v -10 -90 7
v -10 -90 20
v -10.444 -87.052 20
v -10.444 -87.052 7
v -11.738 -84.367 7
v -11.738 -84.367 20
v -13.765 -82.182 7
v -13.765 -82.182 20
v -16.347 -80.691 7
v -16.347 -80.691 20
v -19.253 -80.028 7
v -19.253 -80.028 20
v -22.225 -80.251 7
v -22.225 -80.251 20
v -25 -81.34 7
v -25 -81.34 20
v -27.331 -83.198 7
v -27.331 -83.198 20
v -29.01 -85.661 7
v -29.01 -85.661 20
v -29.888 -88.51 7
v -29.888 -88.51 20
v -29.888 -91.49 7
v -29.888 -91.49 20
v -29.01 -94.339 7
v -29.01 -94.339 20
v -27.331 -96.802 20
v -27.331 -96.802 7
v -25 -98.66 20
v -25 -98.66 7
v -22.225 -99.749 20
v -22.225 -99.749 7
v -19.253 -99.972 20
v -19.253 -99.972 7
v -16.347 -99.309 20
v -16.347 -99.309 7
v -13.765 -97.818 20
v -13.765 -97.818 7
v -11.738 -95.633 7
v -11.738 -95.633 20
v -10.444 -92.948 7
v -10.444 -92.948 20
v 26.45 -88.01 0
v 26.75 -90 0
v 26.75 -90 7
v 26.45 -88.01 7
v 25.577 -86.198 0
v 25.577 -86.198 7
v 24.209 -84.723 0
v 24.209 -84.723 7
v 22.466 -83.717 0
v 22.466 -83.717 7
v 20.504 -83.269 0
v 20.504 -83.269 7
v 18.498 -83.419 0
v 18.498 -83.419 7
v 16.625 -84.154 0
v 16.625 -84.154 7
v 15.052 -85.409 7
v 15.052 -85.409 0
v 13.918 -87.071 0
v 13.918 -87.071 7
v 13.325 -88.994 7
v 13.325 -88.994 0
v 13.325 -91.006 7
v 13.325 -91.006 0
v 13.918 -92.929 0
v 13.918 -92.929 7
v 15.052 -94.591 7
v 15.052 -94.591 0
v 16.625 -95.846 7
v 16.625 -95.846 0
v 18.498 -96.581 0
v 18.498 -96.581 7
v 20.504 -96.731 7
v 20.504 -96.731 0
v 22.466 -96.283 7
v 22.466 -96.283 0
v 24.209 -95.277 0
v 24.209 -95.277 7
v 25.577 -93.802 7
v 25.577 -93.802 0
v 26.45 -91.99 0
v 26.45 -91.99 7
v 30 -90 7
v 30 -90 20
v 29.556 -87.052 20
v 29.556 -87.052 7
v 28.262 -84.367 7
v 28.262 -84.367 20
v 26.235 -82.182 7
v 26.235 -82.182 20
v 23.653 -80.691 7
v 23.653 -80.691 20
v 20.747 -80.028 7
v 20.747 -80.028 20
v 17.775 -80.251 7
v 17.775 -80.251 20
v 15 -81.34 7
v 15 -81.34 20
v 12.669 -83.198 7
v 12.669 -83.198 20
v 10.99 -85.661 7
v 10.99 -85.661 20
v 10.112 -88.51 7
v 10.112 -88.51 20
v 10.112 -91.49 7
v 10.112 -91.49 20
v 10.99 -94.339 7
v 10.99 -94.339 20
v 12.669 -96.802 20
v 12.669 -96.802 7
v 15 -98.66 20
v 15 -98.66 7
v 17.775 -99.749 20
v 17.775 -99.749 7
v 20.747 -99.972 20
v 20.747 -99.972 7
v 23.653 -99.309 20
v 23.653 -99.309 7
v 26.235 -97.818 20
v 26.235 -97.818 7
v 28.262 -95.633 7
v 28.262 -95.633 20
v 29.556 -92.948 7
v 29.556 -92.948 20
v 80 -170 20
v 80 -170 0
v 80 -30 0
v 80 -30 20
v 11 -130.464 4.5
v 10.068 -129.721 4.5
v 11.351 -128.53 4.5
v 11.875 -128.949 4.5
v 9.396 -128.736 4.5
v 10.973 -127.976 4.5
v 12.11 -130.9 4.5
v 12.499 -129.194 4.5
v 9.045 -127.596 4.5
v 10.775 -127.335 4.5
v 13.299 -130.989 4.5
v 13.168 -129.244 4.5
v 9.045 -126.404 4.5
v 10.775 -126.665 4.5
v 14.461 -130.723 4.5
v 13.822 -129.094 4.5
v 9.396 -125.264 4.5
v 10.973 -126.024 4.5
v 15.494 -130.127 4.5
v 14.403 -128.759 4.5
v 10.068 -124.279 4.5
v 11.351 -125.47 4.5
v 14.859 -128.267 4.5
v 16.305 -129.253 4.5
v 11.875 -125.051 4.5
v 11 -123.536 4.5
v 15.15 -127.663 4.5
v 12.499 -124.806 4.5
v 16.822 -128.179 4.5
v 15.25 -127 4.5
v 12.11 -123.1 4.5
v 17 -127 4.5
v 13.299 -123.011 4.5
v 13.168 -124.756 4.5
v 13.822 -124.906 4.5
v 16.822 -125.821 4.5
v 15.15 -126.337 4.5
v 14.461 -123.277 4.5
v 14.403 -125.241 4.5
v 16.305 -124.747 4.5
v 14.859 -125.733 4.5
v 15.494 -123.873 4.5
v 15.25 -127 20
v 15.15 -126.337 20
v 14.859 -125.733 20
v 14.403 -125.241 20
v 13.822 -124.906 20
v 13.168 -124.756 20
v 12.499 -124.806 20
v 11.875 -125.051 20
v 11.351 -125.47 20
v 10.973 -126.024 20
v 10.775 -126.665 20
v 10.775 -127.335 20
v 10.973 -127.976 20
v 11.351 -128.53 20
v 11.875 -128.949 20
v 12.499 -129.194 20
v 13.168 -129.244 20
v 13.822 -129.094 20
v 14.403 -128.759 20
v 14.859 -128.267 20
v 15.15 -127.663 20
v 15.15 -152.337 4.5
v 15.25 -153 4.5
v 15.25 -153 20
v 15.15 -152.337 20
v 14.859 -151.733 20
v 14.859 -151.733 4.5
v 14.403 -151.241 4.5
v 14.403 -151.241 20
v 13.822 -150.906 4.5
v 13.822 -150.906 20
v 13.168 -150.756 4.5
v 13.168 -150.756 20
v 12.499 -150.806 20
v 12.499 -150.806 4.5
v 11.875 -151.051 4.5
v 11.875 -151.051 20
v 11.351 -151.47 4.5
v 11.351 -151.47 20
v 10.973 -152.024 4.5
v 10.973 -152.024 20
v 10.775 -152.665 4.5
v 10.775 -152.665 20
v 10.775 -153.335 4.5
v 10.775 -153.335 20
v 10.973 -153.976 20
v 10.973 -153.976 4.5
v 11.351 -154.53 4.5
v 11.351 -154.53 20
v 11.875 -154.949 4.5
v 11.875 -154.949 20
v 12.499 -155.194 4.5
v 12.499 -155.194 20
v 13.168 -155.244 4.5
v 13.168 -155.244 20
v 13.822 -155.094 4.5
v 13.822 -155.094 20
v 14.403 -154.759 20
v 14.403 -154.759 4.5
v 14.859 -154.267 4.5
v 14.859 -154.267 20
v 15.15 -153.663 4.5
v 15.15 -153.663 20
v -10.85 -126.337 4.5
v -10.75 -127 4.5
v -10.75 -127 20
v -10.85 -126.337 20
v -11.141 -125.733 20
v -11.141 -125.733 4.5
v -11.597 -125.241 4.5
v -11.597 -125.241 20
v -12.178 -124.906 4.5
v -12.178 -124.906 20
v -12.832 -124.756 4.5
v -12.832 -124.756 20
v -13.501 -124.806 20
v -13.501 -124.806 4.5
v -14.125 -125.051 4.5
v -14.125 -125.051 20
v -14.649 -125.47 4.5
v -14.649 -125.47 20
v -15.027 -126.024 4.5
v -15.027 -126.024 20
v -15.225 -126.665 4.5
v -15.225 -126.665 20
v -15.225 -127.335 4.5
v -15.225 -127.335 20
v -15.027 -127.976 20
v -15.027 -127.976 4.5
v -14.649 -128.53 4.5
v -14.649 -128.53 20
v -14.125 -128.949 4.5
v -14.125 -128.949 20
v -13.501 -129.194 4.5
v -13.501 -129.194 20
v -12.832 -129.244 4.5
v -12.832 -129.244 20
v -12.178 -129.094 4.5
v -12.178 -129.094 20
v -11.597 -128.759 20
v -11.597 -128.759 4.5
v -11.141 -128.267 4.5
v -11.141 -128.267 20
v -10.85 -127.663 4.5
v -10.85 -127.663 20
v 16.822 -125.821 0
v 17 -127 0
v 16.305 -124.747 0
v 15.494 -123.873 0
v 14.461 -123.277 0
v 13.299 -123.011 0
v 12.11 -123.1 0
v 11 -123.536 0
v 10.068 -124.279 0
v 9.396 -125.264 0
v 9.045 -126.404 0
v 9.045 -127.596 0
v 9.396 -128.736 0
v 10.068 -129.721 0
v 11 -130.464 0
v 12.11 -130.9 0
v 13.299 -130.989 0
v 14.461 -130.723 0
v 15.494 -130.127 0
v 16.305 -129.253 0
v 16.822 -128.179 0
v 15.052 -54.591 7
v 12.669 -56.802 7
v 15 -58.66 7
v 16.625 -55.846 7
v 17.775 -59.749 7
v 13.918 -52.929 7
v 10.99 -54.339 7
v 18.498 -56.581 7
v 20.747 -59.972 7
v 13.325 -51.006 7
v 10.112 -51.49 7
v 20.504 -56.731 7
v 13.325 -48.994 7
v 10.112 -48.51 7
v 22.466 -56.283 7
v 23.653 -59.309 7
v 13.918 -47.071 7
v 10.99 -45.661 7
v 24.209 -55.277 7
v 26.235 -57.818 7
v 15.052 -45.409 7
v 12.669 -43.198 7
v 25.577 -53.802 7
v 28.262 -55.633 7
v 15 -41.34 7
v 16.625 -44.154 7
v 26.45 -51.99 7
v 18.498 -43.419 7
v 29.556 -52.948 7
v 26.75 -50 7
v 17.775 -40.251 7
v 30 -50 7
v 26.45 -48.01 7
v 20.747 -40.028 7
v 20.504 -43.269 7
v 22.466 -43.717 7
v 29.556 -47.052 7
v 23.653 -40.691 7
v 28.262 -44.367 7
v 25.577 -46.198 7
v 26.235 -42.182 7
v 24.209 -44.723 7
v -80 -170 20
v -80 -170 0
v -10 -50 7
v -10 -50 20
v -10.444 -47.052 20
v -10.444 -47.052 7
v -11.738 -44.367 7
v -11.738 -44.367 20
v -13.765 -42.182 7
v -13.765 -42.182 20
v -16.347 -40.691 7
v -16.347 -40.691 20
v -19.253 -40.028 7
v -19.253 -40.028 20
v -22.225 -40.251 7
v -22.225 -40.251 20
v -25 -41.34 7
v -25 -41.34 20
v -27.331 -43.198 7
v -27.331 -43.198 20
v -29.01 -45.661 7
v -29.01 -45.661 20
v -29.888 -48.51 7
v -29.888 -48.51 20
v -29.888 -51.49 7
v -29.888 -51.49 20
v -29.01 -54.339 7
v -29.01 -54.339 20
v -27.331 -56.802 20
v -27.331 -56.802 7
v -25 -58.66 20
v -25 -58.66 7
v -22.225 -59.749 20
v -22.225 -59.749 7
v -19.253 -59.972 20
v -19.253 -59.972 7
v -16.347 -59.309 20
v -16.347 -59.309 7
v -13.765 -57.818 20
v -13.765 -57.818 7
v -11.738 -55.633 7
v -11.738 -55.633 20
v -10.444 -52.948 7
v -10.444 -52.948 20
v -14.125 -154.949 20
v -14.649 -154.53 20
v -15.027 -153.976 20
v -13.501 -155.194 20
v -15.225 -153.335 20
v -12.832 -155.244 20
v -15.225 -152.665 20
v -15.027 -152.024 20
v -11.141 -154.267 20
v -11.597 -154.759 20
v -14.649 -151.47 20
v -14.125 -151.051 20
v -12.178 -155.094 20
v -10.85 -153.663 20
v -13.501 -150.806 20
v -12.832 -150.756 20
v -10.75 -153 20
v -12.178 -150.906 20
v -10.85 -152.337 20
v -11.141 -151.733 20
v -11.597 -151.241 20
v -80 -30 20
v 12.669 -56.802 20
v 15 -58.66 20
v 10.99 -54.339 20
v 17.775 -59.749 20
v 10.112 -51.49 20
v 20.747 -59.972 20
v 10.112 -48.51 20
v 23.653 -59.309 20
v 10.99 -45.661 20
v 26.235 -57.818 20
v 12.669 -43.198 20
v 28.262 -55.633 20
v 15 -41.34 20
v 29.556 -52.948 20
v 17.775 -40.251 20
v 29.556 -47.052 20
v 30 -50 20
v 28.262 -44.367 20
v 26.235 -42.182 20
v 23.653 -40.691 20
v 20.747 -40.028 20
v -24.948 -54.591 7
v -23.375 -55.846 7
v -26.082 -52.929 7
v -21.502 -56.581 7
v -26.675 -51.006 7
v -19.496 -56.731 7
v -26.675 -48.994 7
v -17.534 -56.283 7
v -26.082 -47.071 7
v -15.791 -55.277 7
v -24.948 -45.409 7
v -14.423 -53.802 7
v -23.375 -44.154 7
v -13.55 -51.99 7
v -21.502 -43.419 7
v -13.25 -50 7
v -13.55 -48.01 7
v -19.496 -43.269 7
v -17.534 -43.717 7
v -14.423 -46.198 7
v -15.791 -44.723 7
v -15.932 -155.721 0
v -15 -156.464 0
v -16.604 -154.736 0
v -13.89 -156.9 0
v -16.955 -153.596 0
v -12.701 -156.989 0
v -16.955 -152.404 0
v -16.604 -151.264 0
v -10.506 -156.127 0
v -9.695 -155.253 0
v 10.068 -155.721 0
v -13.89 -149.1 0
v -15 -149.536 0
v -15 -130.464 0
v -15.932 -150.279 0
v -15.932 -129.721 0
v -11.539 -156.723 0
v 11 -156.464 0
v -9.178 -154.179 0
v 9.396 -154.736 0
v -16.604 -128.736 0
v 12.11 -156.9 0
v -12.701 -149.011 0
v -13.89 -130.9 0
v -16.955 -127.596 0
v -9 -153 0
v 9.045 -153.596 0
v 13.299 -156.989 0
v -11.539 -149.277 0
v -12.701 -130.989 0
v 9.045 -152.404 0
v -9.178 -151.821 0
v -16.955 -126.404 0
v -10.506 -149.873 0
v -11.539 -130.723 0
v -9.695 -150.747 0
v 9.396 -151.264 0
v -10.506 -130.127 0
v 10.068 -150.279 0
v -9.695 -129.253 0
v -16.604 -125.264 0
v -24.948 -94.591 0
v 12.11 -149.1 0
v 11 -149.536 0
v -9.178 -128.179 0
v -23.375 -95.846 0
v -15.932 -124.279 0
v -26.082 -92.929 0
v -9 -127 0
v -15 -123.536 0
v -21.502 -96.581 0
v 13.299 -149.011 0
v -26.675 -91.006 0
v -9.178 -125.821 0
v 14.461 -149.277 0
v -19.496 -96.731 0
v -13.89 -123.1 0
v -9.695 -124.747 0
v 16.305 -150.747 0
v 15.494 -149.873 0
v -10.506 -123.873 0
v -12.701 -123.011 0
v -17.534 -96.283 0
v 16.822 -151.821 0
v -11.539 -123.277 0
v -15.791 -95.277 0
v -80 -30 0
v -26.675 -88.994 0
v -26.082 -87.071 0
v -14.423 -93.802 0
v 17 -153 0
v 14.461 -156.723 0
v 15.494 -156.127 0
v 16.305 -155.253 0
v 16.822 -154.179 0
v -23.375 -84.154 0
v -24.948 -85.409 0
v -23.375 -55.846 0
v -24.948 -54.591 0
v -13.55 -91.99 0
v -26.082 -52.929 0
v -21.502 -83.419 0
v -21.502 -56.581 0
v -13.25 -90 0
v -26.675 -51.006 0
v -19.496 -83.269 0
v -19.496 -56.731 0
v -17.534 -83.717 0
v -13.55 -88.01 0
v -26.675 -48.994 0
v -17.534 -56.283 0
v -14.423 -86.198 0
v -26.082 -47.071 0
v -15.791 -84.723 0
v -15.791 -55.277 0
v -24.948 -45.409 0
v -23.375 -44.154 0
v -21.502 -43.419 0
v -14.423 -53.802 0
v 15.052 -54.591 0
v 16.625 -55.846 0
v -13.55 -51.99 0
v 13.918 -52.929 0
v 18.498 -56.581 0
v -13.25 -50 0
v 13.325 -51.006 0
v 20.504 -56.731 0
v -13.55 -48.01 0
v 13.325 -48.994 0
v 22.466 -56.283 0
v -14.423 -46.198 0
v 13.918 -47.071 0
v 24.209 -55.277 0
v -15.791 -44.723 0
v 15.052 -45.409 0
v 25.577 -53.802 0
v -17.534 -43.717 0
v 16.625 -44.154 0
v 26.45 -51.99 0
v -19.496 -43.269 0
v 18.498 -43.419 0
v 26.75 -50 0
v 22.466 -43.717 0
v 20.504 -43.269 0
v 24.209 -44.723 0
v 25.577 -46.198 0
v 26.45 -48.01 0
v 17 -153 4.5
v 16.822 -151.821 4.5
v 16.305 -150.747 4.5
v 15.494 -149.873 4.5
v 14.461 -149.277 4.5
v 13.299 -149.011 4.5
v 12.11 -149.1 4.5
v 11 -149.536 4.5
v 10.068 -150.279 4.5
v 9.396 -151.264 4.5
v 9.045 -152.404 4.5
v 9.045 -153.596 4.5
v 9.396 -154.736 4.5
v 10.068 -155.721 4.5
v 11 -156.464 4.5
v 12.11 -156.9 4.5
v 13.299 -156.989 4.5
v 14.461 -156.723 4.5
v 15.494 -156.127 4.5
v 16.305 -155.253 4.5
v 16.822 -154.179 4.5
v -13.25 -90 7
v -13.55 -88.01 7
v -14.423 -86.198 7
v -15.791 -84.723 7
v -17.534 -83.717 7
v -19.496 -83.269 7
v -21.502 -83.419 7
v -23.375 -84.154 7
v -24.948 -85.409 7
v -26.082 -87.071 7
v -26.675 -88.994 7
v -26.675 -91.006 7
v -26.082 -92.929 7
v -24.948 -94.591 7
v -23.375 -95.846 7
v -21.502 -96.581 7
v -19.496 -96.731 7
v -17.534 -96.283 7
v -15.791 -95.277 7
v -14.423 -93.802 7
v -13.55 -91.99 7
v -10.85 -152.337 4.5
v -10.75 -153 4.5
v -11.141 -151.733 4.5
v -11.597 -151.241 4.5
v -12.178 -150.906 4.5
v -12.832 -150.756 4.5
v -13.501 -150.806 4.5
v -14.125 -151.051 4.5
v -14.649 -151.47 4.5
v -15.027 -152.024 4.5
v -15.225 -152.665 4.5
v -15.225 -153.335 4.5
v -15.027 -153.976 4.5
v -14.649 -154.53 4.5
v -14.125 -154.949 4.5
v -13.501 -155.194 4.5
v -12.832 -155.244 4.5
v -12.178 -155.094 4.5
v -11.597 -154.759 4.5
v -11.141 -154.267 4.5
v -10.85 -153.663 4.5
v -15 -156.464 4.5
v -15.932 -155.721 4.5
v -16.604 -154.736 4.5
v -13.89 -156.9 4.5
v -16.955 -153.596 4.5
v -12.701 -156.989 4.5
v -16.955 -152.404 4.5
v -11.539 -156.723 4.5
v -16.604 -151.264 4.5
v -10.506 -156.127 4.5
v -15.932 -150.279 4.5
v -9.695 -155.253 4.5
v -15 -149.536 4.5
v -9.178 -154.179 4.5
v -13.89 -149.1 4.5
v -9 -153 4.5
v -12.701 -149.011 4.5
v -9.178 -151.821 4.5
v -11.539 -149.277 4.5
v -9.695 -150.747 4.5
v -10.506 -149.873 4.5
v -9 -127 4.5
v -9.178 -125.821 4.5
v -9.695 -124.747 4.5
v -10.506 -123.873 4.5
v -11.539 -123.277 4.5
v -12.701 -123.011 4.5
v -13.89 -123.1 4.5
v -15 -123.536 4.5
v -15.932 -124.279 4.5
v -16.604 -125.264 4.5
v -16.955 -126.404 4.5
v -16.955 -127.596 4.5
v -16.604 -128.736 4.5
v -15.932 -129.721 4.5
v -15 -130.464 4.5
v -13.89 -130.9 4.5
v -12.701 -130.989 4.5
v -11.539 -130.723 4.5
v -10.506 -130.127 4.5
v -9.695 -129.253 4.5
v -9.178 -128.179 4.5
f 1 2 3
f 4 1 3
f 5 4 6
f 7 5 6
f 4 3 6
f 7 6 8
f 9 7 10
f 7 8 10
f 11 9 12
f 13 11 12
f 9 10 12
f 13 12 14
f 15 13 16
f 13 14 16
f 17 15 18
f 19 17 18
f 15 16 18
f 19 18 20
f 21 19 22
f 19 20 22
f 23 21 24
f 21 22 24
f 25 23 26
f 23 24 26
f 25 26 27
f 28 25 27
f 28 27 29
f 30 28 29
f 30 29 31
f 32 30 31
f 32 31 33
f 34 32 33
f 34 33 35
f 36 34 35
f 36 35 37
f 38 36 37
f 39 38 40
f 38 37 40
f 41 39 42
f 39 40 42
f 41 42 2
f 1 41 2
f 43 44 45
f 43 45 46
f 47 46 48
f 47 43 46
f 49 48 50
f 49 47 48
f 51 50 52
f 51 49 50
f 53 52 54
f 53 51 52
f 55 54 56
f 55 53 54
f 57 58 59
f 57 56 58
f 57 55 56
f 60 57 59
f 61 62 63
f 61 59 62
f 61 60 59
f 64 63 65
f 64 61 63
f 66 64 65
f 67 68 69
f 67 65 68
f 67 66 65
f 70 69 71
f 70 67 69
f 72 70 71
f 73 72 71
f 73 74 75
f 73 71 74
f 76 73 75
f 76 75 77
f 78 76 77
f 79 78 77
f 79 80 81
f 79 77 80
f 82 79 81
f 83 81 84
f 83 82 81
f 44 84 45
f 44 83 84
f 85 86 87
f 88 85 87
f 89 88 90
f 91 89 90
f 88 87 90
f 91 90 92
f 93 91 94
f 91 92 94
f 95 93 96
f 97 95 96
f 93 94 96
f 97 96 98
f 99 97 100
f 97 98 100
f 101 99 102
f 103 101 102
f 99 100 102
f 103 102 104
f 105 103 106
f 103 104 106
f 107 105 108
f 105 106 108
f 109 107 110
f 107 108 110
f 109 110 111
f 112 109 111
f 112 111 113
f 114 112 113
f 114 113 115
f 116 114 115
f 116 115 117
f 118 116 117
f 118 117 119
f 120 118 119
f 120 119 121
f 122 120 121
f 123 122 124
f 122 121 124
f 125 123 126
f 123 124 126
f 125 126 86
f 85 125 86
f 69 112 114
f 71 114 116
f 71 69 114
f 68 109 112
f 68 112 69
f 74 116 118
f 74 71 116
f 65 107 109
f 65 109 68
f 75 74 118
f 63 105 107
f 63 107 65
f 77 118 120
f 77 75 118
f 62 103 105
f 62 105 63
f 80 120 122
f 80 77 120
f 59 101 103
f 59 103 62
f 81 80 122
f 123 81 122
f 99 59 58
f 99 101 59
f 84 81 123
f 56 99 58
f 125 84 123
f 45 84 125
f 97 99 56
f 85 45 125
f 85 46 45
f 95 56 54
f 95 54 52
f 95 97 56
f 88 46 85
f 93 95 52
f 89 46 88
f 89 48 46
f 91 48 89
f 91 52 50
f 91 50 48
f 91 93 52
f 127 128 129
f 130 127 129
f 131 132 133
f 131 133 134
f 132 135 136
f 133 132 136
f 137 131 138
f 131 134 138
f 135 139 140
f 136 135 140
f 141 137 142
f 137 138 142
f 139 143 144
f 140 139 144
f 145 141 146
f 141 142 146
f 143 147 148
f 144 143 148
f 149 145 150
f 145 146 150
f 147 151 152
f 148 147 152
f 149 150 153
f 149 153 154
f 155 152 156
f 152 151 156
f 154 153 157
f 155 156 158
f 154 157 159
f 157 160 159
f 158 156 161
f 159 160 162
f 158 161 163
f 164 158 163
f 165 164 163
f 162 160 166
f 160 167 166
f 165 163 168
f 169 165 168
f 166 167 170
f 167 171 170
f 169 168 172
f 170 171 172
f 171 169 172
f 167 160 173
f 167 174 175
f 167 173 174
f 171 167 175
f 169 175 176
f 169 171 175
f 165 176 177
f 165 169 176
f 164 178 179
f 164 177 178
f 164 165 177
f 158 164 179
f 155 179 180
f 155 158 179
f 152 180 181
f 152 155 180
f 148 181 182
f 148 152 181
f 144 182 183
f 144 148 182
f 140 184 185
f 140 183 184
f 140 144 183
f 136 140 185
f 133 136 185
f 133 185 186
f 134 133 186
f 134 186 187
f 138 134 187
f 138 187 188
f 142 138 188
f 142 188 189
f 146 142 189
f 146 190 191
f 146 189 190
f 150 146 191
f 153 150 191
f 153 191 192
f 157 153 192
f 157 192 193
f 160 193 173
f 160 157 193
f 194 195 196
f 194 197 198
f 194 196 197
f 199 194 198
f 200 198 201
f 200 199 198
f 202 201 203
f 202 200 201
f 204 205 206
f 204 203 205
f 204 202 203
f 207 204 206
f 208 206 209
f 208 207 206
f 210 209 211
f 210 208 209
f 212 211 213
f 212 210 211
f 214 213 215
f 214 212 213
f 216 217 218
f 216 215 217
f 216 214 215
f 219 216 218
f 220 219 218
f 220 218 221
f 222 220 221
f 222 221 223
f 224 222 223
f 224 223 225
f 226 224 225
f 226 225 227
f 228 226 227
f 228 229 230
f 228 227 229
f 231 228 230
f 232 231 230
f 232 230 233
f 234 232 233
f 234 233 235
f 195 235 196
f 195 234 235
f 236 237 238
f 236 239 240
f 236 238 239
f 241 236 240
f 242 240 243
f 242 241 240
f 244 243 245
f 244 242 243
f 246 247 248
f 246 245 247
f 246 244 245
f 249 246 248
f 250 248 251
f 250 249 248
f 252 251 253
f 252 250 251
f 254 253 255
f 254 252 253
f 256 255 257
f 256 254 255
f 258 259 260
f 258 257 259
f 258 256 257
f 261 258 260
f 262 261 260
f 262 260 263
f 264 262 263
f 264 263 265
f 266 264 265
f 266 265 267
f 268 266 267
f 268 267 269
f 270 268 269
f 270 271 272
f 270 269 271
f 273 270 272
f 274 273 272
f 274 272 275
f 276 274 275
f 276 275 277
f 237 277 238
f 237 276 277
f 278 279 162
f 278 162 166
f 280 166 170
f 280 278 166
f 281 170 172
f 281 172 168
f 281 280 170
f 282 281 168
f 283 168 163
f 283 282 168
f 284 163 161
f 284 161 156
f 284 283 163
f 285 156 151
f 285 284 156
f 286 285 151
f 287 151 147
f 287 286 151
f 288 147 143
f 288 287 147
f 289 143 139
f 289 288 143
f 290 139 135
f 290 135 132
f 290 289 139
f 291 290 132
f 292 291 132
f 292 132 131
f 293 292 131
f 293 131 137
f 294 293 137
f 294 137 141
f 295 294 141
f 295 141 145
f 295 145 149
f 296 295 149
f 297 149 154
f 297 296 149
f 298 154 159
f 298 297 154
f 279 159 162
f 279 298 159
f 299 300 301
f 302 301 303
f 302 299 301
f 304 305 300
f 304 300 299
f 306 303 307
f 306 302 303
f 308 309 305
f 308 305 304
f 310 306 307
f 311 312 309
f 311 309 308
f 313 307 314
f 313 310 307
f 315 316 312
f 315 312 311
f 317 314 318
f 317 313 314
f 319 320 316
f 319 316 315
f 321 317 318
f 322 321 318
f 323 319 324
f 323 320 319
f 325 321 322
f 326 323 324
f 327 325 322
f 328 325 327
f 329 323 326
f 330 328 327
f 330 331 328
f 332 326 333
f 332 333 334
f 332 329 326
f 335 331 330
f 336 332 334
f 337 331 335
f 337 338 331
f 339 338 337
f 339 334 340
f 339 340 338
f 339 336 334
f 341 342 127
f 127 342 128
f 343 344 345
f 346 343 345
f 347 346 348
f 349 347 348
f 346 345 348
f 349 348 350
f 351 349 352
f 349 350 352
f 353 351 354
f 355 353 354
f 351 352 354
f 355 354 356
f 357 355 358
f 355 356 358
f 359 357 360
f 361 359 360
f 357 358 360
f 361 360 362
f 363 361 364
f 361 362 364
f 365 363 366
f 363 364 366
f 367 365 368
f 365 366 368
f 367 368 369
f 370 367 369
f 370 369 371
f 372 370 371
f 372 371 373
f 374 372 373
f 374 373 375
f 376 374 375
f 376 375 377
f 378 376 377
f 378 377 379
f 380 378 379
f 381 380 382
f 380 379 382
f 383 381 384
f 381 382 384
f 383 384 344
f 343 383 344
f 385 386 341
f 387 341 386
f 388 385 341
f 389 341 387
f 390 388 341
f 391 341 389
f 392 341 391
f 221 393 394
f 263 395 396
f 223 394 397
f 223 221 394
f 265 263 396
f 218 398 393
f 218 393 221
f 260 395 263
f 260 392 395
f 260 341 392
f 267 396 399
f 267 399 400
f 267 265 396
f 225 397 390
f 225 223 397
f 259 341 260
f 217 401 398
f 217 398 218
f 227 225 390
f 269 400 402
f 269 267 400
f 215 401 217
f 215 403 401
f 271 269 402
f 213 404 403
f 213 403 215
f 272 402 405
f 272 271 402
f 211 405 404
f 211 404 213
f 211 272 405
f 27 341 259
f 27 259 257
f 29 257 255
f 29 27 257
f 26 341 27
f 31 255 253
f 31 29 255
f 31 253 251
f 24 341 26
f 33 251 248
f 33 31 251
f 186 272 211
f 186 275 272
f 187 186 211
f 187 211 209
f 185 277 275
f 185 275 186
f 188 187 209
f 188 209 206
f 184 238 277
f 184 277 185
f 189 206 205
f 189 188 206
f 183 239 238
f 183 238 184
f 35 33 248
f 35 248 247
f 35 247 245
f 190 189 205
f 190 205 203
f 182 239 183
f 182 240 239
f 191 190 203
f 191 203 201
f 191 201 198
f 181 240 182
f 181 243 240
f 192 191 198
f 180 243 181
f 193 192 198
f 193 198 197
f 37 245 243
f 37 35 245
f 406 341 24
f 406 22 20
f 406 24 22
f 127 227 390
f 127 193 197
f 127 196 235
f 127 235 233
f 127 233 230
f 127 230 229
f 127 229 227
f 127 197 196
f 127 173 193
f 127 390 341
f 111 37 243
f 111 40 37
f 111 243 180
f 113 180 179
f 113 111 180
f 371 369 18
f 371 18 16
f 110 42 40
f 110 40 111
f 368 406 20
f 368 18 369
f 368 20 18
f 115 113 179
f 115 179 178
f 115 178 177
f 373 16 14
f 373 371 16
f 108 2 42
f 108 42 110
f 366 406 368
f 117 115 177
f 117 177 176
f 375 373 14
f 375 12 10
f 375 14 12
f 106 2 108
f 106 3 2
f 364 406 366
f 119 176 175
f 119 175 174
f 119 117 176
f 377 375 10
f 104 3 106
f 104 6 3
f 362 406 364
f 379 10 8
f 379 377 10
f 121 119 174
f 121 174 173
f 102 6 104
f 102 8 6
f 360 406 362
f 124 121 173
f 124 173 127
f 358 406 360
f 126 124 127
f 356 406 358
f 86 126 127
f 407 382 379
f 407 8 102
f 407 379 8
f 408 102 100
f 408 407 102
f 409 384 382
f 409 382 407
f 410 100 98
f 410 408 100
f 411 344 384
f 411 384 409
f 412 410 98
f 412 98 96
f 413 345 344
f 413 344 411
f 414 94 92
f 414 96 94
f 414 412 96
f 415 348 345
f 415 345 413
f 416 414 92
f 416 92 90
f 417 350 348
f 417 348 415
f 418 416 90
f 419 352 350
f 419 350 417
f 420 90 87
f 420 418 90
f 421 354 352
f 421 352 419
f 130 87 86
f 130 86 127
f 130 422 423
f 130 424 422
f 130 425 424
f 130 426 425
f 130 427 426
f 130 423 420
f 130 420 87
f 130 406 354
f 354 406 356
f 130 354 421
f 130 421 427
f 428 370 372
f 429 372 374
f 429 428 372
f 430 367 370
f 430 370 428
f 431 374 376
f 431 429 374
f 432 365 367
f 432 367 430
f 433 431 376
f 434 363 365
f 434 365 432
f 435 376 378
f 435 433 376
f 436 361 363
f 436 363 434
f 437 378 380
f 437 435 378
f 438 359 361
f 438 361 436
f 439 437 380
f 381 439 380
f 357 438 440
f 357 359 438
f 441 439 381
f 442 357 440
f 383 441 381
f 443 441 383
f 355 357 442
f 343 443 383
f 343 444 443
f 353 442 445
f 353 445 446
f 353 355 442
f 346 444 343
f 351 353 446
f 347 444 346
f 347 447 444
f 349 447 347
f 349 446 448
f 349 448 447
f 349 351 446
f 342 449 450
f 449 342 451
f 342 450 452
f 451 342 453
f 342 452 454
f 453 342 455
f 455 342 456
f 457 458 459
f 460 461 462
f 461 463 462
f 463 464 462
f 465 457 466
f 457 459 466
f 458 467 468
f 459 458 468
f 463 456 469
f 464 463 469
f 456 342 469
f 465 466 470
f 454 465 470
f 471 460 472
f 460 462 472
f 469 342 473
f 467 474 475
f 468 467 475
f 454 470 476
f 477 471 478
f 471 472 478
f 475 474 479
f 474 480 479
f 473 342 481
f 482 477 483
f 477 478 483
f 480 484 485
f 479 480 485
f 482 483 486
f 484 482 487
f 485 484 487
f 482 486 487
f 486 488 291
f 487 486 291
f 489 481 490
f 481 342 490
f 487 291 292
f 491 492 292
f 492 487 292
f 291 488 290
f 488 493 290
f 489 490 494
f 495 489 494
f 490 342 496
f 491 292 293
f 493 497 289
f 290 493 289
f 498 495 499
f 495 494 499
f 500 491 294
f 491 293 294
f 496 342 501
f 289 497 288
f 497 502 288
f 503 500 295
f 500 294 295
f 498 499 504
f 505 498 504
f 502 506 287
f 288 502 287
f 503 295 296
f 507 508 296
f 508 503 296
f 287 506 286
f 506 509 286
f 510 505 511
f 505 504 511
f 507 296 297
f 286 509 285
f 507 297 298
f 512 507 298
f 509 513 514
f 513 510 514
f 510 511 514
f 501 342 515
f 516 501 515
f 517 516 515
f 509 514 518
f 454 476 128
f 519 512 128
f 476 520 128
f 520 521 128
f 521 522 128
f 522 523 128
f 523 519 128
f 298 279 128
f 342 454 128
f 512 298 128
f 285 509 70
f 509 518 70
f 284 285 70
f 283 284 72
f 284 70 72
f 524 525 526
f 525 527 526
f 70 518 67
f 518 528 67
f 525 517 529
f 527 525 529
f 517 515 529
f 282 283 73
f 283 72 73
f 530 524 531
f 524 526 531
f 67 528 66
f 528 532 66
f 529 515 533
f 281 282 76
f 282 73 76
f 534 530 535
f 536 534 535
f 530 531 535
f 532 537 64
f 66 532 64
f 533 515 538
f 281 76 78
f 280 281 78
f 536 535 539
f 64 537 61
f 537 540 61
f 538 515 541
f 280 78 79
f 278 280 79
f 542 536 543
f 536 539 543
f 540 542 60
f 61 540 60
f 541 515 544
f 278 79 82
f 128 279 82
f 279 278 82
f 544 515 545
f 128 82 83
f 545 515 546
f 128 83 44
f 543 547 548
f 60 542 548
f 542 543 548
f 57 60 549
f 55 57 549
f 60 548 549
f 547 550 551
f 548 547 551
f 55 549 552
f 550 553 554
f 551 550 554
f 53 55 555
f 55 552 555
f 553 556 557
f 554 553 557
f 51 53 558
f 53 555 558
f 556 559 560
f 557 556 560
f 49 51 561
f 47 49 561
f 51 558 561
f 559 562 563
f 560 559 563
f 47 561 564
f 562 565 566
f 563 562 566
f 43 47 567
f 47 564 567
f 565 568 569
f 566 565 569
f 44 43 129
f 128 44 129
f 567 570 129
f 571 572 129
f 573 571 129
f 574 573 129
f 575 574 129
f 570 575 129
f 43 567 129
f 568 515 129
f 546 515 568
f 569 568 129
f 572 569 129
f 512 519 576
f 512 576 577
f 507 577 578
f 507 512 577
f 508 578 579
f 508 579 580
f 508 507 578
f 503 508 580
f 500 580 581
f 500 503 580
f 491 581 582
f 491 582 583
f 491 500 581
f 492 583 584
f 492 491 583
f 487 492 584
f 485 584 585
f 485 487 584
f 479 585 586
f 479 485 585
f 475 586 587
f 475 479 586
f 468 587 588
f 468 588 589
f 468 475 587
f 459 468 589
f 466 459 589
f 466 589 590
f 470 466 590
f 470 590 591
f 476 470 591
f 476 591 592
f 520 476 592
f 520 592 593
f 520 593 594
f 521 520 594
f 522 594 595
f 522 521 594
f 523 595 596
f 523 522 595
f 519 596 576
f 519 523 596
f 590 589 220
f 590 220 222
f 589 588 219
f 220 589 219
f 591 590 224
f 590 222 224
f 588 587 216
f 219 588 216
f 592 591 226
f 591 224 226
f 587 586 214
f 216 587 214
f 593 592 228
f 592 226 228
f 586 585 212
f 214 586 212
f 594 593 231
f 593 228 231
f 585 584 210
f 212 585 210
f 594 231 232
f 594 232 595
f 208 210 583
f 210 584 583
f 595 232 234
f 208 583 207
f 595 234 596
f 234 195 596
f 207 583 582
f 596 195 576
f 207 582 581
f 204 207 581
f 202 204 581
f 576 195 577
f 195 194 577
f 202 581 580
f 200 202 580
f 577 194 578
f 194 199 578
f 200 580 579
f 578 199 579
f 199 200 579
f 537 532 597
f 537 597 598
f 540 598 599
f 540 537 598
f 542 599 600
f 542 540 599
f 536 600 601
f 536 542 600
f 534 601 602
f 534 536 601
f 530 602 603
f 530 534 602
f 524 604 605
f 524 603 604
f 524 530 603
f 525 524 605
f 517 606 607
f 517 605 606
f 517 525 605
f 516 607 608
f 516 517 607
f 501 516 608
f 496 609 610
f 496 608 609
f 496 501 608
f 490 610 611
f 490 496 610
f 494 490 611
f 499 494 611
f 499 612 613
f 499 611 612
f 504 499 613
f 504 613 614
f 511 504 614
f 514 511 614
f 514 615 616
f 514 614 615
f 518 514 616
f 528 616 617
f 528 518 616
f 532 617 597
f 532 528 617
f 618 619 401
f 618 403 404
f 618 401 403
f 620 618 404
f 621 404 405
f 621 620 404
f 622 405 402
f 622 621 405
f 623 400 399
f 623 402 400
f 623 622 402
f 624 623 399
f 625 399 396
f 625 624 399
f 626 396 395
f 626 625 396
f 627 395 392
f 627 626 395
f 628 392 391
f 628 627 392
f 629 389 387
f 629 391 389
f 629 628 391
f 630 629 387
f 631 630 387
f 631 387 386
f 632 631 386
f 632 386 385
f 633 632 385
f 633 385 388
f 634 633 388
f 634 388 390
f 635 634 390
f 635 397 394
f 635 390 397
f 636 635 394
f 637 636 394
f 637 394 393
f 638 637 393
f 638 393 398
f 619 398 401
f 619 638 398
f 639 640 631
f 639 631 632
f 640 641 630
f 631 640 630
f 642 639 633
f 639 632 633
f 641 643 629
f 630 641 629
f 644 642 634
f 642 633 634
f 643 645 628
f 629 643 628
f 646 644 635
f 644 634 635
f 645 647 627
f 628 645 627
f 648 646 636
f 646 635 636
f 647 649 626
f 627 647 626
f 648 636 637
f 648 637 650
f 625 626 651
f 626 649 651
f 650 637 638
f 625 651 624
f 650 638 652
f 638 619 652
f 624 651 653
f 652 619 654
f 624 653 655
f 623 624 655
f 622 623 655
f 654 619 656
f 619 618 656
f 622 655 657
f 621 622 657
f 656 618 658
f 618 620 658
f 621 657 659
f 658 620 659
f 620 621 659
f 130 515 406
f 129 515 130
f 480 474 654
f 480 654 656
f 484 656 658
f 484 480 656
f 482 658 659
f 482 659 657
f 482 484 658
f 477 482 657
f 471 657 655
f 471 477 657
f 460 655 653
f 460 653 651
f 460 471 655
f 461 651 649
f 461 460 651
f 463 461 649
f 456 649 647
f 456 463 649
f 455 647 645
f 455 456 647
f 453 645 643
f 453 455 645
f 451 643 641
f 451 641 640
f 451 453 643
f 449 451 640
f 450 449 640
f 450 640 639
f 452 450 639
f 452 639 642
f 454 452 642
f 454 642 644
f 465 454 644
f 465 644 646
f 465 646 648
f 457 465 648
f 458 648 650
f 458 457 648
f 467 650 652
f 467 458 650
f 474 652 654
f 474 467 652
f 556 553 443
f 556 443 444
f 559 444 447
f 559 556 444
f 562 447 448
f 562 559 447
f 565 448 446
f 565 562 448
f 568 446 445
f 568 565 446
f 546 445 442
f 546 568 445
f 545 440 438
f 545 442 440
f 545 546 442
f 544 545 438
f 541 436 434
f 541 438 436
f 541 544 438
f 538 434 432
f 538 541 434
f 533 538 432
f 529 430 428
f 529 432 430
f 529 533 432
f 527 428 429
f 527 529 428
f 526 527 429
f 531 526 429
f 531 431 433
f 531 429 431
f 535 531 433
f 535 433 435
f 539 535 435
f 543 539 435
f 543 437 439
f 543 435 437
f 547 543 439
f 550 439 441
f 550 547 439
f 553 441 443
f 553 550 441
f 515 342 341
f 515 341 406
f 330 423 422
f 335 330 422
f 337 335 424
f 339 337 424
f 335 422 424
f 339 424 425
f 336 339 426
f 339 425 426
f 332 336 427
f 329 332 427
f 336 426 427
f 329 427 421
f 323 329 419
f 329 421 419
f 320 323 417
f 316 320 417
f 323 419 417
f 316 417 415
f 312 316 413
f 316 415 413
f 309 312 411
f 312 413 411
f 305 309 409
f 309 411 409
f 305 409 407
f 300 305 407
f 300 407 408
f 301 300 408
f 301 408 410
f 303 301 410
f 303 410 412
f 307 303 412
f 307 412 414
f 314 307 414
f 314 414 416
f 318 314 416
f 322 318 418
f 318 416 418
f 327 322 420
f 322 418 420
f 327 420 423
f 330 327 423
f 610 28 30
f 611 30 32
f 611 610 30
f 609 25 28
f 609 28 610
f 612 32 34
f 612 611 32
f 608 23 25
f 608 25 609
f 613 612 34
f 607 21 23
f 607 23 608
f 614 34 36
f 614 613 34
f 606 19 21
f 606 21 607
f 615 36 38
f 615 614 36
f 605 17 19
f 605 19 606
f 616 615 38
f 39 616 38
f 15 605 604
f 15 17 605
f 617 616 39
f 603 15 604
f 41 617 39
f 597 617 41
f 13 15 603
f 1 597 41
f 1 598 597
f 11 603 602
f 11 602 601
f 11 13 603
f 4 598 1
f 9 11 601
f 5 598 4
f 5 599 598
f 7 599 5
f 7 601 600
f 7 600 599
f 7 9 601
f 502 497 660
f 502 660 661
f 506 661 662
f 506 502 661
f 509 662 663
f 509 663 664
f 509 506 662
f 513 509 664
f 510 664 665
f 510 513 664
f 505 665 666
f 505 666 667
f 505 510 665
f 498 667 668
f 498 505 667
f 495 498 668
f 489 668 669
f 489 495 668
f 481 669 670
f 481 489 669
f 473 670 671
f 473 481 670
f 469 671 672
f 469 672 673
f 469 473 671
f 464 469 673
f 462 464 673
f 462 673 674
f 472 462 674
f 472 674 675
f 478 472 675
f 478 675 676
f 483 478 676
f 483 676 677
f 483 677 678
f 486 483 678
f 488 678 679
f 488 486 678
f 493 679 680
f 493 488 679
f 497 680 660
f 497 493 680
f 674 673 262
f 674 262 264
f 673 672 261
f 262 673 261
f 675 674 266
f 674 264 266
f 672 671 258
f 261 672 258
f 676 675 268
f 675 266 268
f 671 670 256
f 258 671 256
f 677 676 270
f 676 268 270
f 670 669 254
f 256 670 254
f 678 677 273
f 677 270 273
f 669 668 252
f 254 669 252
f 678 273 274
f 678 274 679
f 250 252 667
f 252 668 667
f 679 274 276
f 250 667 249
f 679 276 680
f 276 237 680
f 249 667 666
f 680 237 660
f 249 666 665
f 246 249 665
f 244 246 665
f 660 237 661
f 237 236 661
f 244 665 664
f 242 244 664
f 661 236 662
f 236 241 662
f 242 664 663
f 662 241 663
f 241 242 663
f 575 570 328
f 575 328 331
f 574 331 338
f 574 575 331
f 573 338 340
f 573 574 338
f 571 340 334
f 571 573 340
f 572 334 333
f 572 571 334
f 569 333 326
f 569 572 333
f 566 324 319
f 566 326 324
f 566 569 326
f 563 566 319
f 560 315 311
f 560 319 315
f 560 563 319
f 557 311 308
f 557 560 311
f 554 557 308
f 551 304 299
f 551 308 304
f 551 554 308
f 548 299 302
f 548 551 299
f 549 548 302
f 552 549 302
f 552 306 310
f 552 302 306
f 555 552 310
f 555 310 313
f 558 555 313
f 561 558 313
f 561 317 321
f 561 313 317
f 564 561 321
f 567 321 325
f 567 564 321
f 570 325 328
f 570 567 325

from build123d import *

# Parameters (mm, degrees)
SKETCH1_W               = 160
SKETCH1_H               = 140
BOSS_EXTRUDE1_DEPTH     = 20
CUT_EXTRUDE1_DEPTH      = 189.944436277
CUT_EXTRUDE1_DEPTH_BACK = 189.944436277
SKETCH2_R               = 6.75
SKETCH3_R               = 10
CUT_EXTRUDE3_DEPTH      = 13
CUT_EXTRUDE4_DEPTH      = 189.944436277
CUT_EXTRUDE4_DEPTH_BACK = 189.944436277
SKETCH4_R               = 2.25
SKETCH5_R               = 4
CUT_EXTRUDE6_DEPTH      = 4.5


with BuildPart() as part:
    # Sketch1 → Boss-Extrude1 (new body)
    with BuildSketch(Plane.XY):
        with Locations((0, -100)):
            Rectangle(SKETCH1_W, SKETCH1_H)
    extrude(amount=BOSS_EXTRUDE1_DEPTH)

    # Sketch2 → Cut-Extrude1 (cut, two sides: drawn at the far end of the back side and taken through both)
    with BuildSketch(Plane.XY.offset(-CUT_EXTRUDE1_DEPTH_BACK)):
        with Locations((-20, -50)):
            Circle(SKETCH2_R)
        with Locations((-20, -90)):
            Circle(SKETCH2_R)
        with Locations((20, -50)):
            Circle(SKETCH2_R)
        with Locations((20, -90)):
            Circle(SKETCH2_R)
    extrude(amount=CUT_EXTRUDE1_DEPTH + CUT_EXTRUDE1_DEPTH_BACK, mode=Mode.SUBTRACT)

    # Sketch3 → Cut-Extrude3 (cut)
    with BuildSketch(Plane.XY.offset(20)):
        with Locations((-20, -50)):
            Circle(SKETCH3_R)
        with Locations((-20, -90)):
            Circle(SKETCH3_R)
        with Locations((20, -50)):
            Circle(SKETCH3_R)
        with Locations((20, -90)):
            Circle(SKETCH3_R)
    extrude(amount=-CUT_EXTRUDE3_DEPTH, mode=Mode.SUBTRACT)

    # Sketch4 → Cut-Extrude4 (cut, two sides: drawn at the far end of the back side and taken through both)
    with BuildSketch(Plane.XY.offset(-CUT_EXTRUDE4_DEPTH_BACK)):
        with Locations((-13, -127)):
            Circle(SKETCH4_R)
        with Locations((-13, -153)):
            Circle(SKETCH4_R)
        with Locations((13, -127)):
            Circle(SKETCH4_R)
        with Locations((13, -153)):
            Circle(SKETCH4_R)
    extrude(amount=CUT_EXTRUDE4_DEPTH + CUT_EXTRUDE4_DEPTH_BACK, mode=Mode.SUBTRACT)

    # Sketch5 → Cut-Extrude6 (cut)
    with BuildSketch(Plane.XY):
        with Locations((-13, -127)):
            Circle(SKETCH5_R)
        with Locations((-13, -153)):
            Circle(SKETCH5_R)
        with Locations((13, -127)):
            Circle(SKETCH5_R)
        with Locations((13, -153)):
            Circle(SKETCH5_R)
    extrude(amount=CUT_EXTRUDE6_DEPTH, mode=Mode.SUBTRACT)


solid = part.part
